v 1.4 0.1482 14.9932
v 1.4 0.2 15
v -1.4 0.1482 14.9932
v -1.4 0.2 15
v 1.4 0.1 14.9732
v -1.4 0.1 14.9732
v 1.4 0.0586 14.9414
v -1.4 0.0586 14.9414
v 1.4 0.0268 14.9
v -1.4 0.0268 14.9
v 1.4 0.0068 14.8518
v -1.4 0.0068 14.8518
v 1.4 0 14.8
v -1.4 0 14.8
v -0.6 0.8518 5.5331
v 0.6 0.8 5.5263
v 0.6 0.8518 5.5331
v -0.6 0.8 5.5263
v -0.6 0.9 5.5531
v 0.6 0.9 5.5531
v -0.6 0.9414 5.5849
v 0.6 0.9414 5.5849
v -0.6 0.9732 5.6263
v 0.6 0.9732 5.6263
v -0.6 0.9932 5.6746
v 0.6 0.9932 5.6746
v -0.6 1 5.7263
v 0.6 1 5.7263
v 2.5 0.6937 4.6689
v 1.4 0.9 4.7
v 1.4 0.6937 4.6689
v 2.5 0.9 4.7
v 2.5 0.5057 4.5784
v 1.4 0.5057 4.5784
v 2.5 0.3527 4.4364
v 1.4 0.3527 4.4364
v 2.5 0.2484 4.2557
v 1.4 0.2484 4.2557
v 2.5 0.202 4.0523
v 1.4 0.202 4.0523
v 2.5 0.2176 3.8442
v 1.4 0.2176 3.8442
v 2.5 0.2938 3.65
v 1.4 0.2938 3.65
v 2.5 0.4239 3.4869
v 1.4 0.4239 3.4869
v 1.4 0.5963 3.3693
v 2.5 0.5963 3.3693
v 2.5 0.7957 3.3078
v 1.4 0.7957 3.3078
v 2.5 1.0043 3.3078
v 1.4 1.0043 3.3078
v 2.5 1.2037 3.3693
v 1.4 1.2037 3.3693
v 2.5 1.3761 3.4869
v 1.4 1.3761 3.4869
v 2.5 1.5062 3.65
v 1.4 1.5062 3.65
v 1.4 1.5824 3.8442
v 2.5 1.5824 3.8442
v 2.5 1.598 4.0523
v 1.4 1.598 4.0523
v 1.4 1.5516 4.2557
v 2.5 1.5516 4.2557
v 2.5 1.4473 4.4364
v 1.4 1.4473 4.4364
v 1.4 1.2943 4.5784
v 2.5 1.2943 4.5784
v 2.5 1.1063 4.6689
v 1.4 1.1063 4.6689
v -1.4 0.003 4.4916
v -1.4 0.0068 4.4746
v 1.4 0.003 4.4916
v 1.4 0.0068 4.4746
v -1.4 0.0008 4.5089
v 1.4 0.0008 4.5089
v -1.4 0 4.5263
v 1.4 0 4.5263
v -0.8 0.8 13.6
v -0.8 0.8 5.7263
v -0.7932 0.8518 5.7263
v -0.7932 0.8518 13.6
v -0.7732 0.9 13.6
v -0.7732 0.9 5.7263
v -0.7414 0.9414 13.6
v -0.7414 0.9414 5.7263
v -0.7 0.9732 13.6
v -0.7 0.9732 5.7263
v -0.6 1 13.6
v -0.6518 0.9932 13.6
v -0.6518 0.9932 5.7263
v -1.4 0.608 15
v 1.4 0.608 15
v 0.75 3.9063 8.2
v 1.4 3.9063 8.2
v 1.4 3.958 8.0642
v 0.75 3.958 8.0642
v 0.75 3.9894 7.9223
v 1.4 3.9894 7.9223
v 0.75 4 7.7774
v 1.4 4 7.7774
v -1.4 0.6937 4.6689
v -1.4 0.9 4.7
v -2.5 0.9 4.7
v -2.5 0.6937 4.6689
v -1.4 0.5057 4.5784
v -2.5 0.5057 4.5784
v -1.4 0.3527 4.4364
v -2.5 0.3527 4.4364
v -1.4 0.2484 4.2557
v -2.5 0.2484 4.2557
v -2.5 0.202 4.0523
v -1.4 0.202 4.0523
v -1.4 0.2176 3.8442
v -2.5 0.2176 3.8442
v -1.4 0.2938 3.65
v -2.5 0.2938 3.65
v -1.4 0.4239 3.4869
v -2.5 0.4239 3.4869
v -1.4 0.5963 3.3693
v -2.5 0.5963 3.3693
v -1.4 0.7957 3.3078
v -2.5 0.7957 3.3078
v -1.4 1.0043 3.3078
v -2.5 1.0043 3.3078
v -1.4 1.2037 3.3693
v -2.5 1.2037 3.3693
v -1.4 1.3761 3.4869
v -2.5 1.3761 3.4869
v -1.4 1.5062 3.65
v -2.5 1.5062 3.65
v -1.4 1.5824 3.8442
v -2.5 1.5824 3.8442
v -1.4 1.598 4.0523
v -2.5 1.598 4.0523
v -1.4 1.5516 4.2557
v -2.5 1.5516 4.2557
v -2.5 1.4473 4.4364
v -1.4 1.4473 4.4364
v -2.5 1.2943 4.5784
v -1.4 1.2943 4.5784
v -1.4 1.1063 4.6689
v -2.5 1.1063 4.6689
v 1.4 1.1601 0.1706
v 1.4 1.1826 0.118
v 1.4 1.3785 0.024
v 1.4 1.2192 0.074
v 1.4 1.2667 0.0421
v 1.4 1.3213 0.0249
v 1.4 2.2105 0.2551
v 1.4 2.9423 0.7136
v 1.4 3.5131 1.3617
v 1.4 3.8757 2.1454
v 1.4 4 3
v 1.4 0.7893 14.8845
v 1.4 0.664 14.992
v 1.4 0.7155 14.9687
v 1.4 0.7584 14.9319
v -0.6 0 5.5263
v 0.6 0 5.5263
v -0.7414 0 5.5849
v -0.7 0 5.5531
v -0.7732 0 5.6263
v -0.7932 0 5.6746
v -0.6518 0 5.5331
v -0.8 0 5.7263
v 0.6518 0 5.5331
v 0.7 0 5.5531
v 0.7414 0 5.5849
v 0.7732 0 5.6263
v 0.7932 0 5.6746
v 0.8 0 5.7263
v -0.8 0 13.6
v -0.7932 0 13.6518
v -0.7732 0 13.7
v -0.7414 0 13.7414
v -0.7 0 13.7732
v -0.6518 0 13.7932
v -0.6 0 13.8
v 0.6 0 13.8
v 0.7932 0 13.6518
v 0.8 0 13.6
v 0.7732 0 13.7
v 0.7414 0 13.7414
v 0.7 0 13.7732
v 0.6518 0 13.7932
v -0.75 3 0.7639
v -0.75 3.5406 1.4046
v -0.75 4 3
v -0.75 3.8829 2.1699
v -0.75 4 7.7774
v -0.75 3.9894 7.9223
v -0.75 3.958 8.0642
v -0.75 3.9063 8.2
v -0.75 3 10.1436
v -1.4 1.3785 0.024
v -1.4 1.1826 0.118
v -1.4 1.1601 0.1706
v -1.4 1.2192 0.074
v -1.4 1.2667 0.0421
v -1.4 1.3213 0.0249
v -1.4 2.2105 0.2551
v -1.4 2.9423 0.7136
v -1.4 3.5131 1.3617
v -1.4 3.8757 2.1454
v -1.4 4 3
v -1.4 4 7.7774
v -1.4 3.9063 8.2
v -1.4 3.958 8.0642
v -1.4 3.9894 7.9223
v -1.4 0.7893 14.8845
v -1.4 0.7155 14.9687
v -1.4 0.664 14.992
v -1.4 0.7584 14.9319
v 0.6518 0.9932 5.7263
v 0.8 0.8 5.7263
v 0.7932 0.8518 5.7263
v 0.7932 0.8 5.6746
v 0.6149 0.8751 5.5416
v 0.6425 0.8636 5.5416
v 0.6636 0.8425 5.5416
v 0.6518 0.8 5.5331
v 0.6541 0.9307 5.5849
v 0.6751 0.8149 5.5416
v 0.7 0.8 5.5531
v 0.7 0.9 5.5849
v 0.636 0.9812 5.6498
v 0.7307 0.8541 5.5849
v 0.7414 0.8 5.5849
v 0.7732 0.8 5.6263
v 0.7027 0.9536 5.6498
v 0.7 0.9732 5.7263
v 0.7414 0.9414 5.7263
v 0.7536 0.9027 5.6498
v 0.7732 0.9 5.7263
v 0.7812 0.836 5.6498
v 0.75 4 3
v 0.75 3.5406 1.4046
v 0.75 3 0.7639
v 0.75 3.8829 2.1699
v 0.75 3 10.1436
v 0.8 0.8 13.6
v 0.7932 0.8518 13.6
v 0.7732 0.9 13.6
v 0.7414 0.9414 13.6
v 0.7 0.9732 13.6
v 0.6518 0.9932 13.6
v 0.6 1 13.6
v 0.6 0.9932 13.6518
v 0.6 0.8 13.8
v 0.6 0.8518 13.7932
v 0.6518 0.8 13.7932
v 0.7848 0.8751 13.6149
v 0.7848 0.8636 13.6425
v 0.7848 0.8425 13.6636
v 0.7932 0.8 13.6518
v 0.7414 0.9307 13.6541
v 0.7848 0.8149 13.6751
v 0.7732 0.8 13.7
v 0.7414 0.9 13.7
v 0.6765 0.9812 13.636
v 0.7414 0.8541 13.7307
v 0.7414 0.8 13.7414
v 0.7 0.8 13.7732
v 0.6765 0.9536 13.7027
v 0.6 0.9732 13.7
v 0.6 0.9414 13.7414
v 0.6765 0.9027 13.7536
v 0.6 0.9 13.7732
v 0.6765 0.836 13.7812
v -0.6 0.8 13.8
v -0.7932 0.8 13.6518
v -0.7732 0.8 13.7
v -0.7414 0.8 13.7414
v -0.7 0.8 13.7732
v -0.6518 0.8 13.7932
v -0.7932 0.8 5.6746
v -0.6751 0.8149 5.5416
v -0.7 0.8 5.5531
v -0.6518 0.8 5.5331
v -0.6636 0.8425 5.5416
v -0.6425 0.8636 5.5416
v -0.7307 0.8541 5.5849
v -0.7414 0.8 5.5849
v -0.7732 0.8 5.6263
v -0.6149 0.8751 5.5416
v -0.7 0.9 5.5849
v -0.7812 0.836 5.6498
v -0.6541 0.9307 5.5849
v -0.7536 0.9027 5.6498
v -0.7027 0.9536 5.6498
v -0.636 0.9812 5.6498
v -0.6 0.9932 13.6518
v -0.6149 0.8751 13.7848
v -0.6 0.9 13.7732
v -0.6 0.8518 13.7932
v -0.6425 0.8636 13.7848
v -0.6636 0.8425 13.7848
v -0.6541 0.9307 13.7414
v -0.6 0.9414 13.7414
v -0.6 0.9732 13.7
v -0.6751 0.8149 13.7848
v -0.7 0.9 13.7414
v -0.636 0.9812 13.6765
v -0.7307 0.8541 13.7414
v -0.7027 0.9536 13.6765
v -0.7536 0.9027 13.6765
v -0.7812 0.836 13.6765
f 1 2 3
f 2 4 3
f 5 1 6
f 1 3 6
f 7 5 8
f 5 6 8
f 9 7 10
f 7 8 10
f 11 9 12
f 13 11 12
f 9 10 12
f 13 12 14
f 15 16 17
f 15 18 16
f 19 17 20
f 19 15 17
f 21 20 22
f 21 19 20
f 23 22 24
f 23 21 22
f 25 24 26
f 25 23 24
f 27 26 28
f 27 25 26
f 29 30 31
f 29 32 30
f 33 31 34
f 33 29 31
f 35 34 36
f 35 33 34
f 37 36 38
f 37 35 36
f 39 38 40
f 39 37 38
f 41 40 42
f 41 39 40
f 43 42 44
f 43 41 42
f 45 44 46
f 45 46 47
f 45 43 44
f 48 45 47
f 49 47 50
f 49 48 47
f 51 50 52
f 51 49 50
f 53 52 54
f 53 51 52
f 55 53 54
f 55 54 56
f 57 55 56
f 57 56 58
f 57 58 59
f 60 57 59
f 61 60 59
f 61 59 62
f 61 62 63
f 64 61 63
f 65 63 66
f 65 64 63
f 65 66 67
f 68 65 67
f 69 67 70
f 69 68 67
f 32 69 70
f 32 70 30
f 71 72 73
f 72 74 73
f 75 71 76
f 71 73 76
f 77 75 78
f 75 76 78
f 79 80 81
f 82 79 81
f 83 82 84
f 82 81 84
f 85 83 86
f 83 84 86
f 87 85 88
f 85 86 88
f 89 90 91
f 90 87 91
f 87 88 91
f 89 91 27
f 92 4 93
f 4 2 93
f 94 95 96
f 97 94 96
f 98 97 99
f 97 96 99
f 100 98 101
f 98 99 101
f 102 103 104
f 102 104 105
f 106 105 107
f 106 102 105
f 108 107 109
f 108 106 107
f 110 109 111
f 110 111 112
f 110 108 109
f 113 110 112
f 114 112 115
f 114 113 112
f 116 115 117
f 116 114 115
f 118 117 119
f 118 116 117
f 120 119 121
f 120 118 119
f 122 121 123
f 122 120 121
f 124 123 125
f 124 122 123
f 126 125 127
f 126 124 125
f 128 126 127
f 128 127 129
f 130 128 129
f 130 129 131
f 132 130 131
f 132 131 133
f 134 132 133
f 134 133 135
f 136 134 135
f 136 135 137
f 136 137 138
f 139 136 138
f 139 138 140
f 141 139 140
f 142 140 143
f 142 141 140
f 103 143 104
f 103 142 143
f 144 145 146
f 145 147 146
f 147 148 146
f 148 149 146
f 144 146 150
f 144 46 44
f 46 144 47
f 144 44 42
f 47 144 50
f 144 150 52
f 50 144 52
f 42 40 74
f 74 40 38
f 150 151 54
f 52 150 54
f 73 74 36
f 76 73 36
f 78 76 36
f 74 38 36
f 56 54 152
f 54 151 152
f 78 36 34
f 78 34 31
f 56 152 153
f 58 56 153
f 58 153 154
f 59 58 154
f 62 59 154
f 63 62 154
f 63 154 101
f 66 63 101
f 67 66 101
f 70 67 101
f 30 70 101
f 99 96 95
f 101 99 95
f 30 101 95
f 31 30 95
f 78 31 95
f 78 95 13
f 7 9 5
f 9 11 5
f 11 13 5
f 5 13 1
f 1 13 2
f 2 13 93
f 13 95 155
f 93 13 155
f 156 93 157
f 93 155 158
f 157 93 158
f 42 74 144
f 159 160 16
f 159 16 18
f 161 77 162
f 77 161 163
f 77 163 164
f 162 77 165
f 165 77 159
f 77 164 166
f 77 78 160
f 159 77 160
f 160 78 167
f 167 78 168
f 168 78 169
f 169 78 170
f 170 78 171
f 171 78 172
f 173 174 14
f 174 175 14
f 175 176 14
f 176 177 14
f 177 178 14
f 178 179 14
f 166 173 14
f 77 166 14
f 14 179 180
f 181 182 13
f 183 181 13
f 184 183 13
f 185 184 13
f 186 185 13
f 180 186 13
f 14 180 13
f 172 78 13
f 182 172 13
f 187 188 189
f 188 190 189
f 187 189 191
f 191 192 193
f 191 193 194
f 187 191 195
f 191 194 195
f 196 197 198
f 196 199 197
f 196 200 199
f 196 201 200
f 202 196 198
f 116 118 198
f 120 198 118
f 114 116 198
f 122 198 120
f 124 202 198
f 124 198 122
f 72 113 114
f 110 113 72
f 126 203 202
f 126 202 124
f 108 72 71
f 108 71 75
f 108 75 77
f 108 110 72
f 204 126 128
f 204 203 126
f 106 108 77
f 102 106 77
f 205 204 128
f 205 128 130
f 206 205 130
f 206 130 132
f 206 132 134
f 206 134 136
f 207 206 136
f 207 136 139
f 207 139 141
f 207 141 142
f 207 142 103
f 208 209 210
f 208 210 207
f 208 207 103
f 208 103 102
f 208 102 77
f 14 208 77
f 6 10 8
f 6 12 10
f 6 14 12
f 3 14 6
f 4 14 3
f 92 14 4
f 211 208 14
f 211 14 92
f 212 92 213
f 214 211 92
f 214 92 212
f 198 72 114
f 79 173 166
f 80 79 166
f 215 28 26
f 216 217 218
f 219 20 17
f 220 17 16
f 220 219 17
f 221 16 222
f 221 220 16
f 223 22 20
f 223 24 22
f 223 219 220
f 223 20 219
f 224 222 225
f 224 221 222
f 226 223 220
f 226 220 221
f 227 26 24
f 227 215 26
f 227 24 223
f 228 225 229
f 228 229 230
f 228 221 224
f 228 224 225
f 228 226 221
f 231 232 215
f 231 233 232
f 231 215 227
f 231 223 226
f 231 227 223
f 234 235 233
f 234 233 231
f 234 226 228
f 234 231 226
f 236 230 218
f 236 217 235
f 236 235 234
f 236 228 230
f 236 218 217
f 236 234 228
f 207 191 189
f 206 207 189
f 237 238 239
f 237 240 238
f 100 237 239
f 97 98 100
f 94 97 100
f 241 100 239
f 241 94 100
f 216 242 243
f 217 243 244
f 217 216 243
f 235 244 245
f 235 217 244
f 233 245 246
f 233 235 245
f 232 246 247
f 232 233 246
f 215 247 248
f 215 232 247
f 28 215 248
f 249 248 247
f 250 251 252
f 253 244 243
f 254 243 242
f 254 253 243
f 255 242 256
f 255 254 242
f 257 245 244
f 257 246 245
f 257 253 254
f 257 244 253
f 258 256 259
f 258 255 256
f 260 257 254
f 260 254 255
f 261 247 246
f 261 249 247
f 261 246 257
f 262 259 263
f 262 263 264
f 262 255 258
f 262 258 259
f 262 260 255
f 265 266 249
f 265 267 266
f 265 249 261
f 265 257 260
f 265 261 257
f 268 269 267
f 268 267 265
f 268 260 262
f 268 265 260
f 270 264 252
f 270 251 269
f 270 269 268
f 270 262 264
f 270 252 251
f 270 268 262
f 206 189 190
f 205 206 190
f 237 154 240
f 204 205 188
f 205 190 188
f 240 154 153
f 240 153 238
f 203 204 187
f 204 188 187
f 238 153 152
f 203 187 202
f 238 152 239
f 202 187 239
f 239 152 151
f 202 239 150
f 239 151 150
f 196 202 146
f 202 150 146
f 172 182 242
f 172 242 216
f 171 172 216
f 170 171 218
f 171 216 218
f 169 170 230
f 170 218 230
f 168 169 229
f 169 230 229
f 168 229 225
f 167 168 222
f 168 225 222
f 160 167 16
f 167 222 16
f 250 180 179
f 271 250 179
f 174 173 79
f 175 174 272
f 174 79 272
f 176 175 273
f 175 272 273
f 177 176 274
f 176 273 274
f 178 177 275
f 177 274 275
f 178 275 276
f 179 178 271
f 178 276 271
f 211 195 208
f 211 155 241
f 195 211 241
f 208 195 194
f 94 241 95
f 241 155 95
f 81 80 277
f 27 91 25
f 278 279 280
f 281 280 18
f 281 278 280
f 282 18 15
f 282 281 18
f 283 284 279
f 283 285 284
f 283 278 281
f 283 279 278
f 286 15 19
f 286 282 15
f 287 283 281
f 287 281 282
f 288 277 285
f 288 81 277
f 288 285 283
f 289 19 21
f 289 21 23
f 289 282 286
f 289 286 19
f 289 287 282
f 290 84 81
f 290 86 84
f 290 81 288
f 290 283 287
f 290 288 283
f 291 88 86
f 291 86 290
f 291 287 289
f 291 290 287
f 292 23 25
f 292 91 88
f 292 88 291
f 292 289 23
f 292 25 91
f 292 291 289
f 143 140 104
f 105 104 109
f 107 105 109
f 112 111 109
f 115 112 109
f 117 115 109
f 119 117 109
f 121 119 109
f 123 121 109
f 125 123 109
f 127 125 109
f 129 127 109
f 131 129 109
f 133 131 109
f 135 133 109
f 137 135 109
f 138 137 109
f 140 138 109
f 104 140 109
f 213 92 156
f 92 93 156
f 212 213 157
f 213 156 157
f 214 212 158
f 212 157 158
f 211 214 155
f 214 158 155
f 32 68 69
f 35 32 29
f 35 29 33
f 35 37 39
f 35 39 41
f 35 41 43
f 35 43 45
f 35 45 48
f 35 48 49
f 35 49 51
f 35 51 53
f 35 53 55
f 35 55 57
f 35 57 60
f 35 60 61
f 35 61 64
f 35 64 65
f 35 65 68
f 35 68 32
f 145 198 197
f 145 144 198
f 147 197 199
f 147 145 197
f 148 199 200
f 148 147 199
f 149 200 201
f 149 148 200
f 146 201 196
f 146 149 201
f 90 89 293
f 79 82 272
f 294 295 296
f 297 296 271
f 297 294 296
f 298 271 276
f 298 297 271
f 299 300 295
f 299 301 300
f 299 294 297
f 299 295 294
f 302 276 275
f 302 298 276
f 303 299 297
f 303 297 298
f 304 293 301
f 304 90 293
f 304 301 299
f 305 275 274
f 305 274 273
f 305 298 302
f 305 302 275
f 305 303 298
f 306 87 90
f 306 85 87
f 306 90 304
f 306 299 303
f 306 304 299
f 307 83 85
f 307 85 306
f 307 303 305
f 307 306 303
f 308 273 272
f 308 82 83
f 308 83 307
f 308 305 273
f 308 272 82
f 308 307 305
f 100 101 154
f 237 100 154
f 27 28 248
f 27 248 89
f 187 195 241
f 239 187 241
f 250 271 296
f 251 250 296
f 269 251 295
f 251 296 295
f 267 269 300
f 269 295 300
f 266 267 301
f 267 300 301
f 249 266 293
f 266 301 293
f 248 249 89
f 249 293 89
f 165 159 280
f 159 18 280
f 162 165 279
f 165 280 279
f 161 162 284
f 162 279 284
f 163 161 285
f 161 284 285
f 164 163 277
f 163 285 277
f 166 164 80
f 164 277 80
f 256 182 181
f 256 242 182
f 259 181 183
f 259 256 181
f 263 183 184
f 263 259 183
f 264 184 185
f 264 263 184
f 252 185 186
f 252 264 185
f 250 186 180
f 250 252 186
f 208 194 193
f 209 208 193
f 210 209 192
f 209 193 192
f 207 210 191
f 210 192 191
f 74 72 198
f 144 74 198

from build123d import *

# Parameters (mm, degrees)
PROFILE_DEPTH         = 1.4
PIVOTTABS_R           = 0.7
PIVOTTAB_DEPTH        = 2.5
TOPCUTS_W             = 1.5
TOPCUTS_H             = 15
TOPCUT_DEPTH          = 1
PIVOTSLANT_DEPTH      = 16.724185194
PIVOTSLANT_DEPTH_BACK = 16.724185194
PIVOTSLANTF_R         = 0.2
BOTTOMCAVITYS_W       = 1.6
BOTTOMCAVITYS_H       = 8.2736695
BOTTOMCAVITY_DEPTH    = 1
BOTTOMCAVITYF_R       = 0.2


with BuildPart() as part:
    # ProfileS → Profile (new, symmetric)
    with BuildSketch(Plane(origin=(0, 0, 0), x_dir=(0, 0, -1), z_dir=(1, 0, 0))):
        with BuildLine():
            Line((0, 0), (-15, 0))
            Line((-15, 0), (-15, 0.608001659))
            ThreePointArc((-15, 0.608001659), (-14.968678289, 0.715461581), (-14.884523652, 0.789263217))
            Line((-14.884523652, 0.789263217), (-8.2, 3.906307787))
            ThreePointArc((-8.2, 3.906307787), (-7.993821352, 3.976296007), (-7.777381738, 4))
            Line((-7.777381738, 4), (-3, 4))
            ThreePointArc((-3, 4), (-0.878679656, 3.121320344), (0, 1))
            Line((0, 1), (0, 0))
        make_face()
    extrude(amount=PROFILE_DEPTH, both=True)

    # PivotTabS → PivotTab (add, symmetric)
    with BuildSketch(Plane(origin=(0, 0, 0), x_dir=(0, 0, -1), z_dir=(1, 0, 0))):
        with Locations(Location((-4, 0.9, 0), (0, 0, 180))):
            Circle(PIVOTTABS_R)
    extrude(amount=PIVOTTAB_DEPTH, both=True)

    # TopCutS → TopCut (cut)
    with BuildSketch(Plane(origin=(0, 4, 18.512140764), x_dir=(1, 0, 0), z_dir=(0, -1, 0))):
        with Locations((0, -11.012140764)):
            Rectangle(TOPCUTS_W, TOPCUTS_H)
    extrude(amount=TOPCUT_DEPTH, mode=Mode.SUBTRACT)

    # PivotSlantS → PivotSlant (cut, two sides: drawn at the far end of the back side and taken through both)
    with BuildSketch(Plane(origin=(0, 0, 0), x_dir=(0, 0, -1), z_dir=(1, 0, 0)).offset(-PIVOTSLANT_DEPTH_BACK)):
        Polygon((-4.5, 0), (0, 1.205771366), (0, 0), align=None)
    extrude(amount=PIVOTSLANT_DEPTH + PIVOTSLANT_DEPTH_BACK, mode=Mode.SUBTRACT)

    # PivotSlantF
    pivotslantf_edges = [part.edges().sort_by_distance(p)[0] for p in [
        (0, 0, 15),
        (0, 0, 4.5),
        (0, 1.203912318, 0.006938062),
    ]]
    fillet(pivotslantf_edges, radius=PIVOTSLANTF_R)

    # BottomCavityS → BottomCavity (cut)
    with BuildSketch(Plane(origin=(0, 0, 0), x_dir=(-1, 0, 0), z_dir=(0, -1, 0))):
        with Locations((0, -9.66316525)):
            Rectangle(BOTTOMCAVITYS_W, BOTTOMCAVITYS_H)
    extrude(amount=-BOTTOMCAVITY_DEPTH, mode=Mode.SUBTRACT)

    # BottomCavityF
    bottomcavityf_edges = [part.edges().sort_by_distance(p)[0] for p in [
        (-0.8, 1, 9.66316525),
        (-0.8, 0.5, 5.5263305),
        (0, 1, 13.8),
        (-0.8, 0.5, 13.8),
        (0.8, 1, 9.66316525),
        (0.8, 0.5, 13.8),
        (0, 1, 5.5263305),
        (0.8, 0.5, 5.5263305),
    ]]
    fillet(bottomcavityf_edges, radius=BOTTOMCAVITYF_R)


solid = part.part
